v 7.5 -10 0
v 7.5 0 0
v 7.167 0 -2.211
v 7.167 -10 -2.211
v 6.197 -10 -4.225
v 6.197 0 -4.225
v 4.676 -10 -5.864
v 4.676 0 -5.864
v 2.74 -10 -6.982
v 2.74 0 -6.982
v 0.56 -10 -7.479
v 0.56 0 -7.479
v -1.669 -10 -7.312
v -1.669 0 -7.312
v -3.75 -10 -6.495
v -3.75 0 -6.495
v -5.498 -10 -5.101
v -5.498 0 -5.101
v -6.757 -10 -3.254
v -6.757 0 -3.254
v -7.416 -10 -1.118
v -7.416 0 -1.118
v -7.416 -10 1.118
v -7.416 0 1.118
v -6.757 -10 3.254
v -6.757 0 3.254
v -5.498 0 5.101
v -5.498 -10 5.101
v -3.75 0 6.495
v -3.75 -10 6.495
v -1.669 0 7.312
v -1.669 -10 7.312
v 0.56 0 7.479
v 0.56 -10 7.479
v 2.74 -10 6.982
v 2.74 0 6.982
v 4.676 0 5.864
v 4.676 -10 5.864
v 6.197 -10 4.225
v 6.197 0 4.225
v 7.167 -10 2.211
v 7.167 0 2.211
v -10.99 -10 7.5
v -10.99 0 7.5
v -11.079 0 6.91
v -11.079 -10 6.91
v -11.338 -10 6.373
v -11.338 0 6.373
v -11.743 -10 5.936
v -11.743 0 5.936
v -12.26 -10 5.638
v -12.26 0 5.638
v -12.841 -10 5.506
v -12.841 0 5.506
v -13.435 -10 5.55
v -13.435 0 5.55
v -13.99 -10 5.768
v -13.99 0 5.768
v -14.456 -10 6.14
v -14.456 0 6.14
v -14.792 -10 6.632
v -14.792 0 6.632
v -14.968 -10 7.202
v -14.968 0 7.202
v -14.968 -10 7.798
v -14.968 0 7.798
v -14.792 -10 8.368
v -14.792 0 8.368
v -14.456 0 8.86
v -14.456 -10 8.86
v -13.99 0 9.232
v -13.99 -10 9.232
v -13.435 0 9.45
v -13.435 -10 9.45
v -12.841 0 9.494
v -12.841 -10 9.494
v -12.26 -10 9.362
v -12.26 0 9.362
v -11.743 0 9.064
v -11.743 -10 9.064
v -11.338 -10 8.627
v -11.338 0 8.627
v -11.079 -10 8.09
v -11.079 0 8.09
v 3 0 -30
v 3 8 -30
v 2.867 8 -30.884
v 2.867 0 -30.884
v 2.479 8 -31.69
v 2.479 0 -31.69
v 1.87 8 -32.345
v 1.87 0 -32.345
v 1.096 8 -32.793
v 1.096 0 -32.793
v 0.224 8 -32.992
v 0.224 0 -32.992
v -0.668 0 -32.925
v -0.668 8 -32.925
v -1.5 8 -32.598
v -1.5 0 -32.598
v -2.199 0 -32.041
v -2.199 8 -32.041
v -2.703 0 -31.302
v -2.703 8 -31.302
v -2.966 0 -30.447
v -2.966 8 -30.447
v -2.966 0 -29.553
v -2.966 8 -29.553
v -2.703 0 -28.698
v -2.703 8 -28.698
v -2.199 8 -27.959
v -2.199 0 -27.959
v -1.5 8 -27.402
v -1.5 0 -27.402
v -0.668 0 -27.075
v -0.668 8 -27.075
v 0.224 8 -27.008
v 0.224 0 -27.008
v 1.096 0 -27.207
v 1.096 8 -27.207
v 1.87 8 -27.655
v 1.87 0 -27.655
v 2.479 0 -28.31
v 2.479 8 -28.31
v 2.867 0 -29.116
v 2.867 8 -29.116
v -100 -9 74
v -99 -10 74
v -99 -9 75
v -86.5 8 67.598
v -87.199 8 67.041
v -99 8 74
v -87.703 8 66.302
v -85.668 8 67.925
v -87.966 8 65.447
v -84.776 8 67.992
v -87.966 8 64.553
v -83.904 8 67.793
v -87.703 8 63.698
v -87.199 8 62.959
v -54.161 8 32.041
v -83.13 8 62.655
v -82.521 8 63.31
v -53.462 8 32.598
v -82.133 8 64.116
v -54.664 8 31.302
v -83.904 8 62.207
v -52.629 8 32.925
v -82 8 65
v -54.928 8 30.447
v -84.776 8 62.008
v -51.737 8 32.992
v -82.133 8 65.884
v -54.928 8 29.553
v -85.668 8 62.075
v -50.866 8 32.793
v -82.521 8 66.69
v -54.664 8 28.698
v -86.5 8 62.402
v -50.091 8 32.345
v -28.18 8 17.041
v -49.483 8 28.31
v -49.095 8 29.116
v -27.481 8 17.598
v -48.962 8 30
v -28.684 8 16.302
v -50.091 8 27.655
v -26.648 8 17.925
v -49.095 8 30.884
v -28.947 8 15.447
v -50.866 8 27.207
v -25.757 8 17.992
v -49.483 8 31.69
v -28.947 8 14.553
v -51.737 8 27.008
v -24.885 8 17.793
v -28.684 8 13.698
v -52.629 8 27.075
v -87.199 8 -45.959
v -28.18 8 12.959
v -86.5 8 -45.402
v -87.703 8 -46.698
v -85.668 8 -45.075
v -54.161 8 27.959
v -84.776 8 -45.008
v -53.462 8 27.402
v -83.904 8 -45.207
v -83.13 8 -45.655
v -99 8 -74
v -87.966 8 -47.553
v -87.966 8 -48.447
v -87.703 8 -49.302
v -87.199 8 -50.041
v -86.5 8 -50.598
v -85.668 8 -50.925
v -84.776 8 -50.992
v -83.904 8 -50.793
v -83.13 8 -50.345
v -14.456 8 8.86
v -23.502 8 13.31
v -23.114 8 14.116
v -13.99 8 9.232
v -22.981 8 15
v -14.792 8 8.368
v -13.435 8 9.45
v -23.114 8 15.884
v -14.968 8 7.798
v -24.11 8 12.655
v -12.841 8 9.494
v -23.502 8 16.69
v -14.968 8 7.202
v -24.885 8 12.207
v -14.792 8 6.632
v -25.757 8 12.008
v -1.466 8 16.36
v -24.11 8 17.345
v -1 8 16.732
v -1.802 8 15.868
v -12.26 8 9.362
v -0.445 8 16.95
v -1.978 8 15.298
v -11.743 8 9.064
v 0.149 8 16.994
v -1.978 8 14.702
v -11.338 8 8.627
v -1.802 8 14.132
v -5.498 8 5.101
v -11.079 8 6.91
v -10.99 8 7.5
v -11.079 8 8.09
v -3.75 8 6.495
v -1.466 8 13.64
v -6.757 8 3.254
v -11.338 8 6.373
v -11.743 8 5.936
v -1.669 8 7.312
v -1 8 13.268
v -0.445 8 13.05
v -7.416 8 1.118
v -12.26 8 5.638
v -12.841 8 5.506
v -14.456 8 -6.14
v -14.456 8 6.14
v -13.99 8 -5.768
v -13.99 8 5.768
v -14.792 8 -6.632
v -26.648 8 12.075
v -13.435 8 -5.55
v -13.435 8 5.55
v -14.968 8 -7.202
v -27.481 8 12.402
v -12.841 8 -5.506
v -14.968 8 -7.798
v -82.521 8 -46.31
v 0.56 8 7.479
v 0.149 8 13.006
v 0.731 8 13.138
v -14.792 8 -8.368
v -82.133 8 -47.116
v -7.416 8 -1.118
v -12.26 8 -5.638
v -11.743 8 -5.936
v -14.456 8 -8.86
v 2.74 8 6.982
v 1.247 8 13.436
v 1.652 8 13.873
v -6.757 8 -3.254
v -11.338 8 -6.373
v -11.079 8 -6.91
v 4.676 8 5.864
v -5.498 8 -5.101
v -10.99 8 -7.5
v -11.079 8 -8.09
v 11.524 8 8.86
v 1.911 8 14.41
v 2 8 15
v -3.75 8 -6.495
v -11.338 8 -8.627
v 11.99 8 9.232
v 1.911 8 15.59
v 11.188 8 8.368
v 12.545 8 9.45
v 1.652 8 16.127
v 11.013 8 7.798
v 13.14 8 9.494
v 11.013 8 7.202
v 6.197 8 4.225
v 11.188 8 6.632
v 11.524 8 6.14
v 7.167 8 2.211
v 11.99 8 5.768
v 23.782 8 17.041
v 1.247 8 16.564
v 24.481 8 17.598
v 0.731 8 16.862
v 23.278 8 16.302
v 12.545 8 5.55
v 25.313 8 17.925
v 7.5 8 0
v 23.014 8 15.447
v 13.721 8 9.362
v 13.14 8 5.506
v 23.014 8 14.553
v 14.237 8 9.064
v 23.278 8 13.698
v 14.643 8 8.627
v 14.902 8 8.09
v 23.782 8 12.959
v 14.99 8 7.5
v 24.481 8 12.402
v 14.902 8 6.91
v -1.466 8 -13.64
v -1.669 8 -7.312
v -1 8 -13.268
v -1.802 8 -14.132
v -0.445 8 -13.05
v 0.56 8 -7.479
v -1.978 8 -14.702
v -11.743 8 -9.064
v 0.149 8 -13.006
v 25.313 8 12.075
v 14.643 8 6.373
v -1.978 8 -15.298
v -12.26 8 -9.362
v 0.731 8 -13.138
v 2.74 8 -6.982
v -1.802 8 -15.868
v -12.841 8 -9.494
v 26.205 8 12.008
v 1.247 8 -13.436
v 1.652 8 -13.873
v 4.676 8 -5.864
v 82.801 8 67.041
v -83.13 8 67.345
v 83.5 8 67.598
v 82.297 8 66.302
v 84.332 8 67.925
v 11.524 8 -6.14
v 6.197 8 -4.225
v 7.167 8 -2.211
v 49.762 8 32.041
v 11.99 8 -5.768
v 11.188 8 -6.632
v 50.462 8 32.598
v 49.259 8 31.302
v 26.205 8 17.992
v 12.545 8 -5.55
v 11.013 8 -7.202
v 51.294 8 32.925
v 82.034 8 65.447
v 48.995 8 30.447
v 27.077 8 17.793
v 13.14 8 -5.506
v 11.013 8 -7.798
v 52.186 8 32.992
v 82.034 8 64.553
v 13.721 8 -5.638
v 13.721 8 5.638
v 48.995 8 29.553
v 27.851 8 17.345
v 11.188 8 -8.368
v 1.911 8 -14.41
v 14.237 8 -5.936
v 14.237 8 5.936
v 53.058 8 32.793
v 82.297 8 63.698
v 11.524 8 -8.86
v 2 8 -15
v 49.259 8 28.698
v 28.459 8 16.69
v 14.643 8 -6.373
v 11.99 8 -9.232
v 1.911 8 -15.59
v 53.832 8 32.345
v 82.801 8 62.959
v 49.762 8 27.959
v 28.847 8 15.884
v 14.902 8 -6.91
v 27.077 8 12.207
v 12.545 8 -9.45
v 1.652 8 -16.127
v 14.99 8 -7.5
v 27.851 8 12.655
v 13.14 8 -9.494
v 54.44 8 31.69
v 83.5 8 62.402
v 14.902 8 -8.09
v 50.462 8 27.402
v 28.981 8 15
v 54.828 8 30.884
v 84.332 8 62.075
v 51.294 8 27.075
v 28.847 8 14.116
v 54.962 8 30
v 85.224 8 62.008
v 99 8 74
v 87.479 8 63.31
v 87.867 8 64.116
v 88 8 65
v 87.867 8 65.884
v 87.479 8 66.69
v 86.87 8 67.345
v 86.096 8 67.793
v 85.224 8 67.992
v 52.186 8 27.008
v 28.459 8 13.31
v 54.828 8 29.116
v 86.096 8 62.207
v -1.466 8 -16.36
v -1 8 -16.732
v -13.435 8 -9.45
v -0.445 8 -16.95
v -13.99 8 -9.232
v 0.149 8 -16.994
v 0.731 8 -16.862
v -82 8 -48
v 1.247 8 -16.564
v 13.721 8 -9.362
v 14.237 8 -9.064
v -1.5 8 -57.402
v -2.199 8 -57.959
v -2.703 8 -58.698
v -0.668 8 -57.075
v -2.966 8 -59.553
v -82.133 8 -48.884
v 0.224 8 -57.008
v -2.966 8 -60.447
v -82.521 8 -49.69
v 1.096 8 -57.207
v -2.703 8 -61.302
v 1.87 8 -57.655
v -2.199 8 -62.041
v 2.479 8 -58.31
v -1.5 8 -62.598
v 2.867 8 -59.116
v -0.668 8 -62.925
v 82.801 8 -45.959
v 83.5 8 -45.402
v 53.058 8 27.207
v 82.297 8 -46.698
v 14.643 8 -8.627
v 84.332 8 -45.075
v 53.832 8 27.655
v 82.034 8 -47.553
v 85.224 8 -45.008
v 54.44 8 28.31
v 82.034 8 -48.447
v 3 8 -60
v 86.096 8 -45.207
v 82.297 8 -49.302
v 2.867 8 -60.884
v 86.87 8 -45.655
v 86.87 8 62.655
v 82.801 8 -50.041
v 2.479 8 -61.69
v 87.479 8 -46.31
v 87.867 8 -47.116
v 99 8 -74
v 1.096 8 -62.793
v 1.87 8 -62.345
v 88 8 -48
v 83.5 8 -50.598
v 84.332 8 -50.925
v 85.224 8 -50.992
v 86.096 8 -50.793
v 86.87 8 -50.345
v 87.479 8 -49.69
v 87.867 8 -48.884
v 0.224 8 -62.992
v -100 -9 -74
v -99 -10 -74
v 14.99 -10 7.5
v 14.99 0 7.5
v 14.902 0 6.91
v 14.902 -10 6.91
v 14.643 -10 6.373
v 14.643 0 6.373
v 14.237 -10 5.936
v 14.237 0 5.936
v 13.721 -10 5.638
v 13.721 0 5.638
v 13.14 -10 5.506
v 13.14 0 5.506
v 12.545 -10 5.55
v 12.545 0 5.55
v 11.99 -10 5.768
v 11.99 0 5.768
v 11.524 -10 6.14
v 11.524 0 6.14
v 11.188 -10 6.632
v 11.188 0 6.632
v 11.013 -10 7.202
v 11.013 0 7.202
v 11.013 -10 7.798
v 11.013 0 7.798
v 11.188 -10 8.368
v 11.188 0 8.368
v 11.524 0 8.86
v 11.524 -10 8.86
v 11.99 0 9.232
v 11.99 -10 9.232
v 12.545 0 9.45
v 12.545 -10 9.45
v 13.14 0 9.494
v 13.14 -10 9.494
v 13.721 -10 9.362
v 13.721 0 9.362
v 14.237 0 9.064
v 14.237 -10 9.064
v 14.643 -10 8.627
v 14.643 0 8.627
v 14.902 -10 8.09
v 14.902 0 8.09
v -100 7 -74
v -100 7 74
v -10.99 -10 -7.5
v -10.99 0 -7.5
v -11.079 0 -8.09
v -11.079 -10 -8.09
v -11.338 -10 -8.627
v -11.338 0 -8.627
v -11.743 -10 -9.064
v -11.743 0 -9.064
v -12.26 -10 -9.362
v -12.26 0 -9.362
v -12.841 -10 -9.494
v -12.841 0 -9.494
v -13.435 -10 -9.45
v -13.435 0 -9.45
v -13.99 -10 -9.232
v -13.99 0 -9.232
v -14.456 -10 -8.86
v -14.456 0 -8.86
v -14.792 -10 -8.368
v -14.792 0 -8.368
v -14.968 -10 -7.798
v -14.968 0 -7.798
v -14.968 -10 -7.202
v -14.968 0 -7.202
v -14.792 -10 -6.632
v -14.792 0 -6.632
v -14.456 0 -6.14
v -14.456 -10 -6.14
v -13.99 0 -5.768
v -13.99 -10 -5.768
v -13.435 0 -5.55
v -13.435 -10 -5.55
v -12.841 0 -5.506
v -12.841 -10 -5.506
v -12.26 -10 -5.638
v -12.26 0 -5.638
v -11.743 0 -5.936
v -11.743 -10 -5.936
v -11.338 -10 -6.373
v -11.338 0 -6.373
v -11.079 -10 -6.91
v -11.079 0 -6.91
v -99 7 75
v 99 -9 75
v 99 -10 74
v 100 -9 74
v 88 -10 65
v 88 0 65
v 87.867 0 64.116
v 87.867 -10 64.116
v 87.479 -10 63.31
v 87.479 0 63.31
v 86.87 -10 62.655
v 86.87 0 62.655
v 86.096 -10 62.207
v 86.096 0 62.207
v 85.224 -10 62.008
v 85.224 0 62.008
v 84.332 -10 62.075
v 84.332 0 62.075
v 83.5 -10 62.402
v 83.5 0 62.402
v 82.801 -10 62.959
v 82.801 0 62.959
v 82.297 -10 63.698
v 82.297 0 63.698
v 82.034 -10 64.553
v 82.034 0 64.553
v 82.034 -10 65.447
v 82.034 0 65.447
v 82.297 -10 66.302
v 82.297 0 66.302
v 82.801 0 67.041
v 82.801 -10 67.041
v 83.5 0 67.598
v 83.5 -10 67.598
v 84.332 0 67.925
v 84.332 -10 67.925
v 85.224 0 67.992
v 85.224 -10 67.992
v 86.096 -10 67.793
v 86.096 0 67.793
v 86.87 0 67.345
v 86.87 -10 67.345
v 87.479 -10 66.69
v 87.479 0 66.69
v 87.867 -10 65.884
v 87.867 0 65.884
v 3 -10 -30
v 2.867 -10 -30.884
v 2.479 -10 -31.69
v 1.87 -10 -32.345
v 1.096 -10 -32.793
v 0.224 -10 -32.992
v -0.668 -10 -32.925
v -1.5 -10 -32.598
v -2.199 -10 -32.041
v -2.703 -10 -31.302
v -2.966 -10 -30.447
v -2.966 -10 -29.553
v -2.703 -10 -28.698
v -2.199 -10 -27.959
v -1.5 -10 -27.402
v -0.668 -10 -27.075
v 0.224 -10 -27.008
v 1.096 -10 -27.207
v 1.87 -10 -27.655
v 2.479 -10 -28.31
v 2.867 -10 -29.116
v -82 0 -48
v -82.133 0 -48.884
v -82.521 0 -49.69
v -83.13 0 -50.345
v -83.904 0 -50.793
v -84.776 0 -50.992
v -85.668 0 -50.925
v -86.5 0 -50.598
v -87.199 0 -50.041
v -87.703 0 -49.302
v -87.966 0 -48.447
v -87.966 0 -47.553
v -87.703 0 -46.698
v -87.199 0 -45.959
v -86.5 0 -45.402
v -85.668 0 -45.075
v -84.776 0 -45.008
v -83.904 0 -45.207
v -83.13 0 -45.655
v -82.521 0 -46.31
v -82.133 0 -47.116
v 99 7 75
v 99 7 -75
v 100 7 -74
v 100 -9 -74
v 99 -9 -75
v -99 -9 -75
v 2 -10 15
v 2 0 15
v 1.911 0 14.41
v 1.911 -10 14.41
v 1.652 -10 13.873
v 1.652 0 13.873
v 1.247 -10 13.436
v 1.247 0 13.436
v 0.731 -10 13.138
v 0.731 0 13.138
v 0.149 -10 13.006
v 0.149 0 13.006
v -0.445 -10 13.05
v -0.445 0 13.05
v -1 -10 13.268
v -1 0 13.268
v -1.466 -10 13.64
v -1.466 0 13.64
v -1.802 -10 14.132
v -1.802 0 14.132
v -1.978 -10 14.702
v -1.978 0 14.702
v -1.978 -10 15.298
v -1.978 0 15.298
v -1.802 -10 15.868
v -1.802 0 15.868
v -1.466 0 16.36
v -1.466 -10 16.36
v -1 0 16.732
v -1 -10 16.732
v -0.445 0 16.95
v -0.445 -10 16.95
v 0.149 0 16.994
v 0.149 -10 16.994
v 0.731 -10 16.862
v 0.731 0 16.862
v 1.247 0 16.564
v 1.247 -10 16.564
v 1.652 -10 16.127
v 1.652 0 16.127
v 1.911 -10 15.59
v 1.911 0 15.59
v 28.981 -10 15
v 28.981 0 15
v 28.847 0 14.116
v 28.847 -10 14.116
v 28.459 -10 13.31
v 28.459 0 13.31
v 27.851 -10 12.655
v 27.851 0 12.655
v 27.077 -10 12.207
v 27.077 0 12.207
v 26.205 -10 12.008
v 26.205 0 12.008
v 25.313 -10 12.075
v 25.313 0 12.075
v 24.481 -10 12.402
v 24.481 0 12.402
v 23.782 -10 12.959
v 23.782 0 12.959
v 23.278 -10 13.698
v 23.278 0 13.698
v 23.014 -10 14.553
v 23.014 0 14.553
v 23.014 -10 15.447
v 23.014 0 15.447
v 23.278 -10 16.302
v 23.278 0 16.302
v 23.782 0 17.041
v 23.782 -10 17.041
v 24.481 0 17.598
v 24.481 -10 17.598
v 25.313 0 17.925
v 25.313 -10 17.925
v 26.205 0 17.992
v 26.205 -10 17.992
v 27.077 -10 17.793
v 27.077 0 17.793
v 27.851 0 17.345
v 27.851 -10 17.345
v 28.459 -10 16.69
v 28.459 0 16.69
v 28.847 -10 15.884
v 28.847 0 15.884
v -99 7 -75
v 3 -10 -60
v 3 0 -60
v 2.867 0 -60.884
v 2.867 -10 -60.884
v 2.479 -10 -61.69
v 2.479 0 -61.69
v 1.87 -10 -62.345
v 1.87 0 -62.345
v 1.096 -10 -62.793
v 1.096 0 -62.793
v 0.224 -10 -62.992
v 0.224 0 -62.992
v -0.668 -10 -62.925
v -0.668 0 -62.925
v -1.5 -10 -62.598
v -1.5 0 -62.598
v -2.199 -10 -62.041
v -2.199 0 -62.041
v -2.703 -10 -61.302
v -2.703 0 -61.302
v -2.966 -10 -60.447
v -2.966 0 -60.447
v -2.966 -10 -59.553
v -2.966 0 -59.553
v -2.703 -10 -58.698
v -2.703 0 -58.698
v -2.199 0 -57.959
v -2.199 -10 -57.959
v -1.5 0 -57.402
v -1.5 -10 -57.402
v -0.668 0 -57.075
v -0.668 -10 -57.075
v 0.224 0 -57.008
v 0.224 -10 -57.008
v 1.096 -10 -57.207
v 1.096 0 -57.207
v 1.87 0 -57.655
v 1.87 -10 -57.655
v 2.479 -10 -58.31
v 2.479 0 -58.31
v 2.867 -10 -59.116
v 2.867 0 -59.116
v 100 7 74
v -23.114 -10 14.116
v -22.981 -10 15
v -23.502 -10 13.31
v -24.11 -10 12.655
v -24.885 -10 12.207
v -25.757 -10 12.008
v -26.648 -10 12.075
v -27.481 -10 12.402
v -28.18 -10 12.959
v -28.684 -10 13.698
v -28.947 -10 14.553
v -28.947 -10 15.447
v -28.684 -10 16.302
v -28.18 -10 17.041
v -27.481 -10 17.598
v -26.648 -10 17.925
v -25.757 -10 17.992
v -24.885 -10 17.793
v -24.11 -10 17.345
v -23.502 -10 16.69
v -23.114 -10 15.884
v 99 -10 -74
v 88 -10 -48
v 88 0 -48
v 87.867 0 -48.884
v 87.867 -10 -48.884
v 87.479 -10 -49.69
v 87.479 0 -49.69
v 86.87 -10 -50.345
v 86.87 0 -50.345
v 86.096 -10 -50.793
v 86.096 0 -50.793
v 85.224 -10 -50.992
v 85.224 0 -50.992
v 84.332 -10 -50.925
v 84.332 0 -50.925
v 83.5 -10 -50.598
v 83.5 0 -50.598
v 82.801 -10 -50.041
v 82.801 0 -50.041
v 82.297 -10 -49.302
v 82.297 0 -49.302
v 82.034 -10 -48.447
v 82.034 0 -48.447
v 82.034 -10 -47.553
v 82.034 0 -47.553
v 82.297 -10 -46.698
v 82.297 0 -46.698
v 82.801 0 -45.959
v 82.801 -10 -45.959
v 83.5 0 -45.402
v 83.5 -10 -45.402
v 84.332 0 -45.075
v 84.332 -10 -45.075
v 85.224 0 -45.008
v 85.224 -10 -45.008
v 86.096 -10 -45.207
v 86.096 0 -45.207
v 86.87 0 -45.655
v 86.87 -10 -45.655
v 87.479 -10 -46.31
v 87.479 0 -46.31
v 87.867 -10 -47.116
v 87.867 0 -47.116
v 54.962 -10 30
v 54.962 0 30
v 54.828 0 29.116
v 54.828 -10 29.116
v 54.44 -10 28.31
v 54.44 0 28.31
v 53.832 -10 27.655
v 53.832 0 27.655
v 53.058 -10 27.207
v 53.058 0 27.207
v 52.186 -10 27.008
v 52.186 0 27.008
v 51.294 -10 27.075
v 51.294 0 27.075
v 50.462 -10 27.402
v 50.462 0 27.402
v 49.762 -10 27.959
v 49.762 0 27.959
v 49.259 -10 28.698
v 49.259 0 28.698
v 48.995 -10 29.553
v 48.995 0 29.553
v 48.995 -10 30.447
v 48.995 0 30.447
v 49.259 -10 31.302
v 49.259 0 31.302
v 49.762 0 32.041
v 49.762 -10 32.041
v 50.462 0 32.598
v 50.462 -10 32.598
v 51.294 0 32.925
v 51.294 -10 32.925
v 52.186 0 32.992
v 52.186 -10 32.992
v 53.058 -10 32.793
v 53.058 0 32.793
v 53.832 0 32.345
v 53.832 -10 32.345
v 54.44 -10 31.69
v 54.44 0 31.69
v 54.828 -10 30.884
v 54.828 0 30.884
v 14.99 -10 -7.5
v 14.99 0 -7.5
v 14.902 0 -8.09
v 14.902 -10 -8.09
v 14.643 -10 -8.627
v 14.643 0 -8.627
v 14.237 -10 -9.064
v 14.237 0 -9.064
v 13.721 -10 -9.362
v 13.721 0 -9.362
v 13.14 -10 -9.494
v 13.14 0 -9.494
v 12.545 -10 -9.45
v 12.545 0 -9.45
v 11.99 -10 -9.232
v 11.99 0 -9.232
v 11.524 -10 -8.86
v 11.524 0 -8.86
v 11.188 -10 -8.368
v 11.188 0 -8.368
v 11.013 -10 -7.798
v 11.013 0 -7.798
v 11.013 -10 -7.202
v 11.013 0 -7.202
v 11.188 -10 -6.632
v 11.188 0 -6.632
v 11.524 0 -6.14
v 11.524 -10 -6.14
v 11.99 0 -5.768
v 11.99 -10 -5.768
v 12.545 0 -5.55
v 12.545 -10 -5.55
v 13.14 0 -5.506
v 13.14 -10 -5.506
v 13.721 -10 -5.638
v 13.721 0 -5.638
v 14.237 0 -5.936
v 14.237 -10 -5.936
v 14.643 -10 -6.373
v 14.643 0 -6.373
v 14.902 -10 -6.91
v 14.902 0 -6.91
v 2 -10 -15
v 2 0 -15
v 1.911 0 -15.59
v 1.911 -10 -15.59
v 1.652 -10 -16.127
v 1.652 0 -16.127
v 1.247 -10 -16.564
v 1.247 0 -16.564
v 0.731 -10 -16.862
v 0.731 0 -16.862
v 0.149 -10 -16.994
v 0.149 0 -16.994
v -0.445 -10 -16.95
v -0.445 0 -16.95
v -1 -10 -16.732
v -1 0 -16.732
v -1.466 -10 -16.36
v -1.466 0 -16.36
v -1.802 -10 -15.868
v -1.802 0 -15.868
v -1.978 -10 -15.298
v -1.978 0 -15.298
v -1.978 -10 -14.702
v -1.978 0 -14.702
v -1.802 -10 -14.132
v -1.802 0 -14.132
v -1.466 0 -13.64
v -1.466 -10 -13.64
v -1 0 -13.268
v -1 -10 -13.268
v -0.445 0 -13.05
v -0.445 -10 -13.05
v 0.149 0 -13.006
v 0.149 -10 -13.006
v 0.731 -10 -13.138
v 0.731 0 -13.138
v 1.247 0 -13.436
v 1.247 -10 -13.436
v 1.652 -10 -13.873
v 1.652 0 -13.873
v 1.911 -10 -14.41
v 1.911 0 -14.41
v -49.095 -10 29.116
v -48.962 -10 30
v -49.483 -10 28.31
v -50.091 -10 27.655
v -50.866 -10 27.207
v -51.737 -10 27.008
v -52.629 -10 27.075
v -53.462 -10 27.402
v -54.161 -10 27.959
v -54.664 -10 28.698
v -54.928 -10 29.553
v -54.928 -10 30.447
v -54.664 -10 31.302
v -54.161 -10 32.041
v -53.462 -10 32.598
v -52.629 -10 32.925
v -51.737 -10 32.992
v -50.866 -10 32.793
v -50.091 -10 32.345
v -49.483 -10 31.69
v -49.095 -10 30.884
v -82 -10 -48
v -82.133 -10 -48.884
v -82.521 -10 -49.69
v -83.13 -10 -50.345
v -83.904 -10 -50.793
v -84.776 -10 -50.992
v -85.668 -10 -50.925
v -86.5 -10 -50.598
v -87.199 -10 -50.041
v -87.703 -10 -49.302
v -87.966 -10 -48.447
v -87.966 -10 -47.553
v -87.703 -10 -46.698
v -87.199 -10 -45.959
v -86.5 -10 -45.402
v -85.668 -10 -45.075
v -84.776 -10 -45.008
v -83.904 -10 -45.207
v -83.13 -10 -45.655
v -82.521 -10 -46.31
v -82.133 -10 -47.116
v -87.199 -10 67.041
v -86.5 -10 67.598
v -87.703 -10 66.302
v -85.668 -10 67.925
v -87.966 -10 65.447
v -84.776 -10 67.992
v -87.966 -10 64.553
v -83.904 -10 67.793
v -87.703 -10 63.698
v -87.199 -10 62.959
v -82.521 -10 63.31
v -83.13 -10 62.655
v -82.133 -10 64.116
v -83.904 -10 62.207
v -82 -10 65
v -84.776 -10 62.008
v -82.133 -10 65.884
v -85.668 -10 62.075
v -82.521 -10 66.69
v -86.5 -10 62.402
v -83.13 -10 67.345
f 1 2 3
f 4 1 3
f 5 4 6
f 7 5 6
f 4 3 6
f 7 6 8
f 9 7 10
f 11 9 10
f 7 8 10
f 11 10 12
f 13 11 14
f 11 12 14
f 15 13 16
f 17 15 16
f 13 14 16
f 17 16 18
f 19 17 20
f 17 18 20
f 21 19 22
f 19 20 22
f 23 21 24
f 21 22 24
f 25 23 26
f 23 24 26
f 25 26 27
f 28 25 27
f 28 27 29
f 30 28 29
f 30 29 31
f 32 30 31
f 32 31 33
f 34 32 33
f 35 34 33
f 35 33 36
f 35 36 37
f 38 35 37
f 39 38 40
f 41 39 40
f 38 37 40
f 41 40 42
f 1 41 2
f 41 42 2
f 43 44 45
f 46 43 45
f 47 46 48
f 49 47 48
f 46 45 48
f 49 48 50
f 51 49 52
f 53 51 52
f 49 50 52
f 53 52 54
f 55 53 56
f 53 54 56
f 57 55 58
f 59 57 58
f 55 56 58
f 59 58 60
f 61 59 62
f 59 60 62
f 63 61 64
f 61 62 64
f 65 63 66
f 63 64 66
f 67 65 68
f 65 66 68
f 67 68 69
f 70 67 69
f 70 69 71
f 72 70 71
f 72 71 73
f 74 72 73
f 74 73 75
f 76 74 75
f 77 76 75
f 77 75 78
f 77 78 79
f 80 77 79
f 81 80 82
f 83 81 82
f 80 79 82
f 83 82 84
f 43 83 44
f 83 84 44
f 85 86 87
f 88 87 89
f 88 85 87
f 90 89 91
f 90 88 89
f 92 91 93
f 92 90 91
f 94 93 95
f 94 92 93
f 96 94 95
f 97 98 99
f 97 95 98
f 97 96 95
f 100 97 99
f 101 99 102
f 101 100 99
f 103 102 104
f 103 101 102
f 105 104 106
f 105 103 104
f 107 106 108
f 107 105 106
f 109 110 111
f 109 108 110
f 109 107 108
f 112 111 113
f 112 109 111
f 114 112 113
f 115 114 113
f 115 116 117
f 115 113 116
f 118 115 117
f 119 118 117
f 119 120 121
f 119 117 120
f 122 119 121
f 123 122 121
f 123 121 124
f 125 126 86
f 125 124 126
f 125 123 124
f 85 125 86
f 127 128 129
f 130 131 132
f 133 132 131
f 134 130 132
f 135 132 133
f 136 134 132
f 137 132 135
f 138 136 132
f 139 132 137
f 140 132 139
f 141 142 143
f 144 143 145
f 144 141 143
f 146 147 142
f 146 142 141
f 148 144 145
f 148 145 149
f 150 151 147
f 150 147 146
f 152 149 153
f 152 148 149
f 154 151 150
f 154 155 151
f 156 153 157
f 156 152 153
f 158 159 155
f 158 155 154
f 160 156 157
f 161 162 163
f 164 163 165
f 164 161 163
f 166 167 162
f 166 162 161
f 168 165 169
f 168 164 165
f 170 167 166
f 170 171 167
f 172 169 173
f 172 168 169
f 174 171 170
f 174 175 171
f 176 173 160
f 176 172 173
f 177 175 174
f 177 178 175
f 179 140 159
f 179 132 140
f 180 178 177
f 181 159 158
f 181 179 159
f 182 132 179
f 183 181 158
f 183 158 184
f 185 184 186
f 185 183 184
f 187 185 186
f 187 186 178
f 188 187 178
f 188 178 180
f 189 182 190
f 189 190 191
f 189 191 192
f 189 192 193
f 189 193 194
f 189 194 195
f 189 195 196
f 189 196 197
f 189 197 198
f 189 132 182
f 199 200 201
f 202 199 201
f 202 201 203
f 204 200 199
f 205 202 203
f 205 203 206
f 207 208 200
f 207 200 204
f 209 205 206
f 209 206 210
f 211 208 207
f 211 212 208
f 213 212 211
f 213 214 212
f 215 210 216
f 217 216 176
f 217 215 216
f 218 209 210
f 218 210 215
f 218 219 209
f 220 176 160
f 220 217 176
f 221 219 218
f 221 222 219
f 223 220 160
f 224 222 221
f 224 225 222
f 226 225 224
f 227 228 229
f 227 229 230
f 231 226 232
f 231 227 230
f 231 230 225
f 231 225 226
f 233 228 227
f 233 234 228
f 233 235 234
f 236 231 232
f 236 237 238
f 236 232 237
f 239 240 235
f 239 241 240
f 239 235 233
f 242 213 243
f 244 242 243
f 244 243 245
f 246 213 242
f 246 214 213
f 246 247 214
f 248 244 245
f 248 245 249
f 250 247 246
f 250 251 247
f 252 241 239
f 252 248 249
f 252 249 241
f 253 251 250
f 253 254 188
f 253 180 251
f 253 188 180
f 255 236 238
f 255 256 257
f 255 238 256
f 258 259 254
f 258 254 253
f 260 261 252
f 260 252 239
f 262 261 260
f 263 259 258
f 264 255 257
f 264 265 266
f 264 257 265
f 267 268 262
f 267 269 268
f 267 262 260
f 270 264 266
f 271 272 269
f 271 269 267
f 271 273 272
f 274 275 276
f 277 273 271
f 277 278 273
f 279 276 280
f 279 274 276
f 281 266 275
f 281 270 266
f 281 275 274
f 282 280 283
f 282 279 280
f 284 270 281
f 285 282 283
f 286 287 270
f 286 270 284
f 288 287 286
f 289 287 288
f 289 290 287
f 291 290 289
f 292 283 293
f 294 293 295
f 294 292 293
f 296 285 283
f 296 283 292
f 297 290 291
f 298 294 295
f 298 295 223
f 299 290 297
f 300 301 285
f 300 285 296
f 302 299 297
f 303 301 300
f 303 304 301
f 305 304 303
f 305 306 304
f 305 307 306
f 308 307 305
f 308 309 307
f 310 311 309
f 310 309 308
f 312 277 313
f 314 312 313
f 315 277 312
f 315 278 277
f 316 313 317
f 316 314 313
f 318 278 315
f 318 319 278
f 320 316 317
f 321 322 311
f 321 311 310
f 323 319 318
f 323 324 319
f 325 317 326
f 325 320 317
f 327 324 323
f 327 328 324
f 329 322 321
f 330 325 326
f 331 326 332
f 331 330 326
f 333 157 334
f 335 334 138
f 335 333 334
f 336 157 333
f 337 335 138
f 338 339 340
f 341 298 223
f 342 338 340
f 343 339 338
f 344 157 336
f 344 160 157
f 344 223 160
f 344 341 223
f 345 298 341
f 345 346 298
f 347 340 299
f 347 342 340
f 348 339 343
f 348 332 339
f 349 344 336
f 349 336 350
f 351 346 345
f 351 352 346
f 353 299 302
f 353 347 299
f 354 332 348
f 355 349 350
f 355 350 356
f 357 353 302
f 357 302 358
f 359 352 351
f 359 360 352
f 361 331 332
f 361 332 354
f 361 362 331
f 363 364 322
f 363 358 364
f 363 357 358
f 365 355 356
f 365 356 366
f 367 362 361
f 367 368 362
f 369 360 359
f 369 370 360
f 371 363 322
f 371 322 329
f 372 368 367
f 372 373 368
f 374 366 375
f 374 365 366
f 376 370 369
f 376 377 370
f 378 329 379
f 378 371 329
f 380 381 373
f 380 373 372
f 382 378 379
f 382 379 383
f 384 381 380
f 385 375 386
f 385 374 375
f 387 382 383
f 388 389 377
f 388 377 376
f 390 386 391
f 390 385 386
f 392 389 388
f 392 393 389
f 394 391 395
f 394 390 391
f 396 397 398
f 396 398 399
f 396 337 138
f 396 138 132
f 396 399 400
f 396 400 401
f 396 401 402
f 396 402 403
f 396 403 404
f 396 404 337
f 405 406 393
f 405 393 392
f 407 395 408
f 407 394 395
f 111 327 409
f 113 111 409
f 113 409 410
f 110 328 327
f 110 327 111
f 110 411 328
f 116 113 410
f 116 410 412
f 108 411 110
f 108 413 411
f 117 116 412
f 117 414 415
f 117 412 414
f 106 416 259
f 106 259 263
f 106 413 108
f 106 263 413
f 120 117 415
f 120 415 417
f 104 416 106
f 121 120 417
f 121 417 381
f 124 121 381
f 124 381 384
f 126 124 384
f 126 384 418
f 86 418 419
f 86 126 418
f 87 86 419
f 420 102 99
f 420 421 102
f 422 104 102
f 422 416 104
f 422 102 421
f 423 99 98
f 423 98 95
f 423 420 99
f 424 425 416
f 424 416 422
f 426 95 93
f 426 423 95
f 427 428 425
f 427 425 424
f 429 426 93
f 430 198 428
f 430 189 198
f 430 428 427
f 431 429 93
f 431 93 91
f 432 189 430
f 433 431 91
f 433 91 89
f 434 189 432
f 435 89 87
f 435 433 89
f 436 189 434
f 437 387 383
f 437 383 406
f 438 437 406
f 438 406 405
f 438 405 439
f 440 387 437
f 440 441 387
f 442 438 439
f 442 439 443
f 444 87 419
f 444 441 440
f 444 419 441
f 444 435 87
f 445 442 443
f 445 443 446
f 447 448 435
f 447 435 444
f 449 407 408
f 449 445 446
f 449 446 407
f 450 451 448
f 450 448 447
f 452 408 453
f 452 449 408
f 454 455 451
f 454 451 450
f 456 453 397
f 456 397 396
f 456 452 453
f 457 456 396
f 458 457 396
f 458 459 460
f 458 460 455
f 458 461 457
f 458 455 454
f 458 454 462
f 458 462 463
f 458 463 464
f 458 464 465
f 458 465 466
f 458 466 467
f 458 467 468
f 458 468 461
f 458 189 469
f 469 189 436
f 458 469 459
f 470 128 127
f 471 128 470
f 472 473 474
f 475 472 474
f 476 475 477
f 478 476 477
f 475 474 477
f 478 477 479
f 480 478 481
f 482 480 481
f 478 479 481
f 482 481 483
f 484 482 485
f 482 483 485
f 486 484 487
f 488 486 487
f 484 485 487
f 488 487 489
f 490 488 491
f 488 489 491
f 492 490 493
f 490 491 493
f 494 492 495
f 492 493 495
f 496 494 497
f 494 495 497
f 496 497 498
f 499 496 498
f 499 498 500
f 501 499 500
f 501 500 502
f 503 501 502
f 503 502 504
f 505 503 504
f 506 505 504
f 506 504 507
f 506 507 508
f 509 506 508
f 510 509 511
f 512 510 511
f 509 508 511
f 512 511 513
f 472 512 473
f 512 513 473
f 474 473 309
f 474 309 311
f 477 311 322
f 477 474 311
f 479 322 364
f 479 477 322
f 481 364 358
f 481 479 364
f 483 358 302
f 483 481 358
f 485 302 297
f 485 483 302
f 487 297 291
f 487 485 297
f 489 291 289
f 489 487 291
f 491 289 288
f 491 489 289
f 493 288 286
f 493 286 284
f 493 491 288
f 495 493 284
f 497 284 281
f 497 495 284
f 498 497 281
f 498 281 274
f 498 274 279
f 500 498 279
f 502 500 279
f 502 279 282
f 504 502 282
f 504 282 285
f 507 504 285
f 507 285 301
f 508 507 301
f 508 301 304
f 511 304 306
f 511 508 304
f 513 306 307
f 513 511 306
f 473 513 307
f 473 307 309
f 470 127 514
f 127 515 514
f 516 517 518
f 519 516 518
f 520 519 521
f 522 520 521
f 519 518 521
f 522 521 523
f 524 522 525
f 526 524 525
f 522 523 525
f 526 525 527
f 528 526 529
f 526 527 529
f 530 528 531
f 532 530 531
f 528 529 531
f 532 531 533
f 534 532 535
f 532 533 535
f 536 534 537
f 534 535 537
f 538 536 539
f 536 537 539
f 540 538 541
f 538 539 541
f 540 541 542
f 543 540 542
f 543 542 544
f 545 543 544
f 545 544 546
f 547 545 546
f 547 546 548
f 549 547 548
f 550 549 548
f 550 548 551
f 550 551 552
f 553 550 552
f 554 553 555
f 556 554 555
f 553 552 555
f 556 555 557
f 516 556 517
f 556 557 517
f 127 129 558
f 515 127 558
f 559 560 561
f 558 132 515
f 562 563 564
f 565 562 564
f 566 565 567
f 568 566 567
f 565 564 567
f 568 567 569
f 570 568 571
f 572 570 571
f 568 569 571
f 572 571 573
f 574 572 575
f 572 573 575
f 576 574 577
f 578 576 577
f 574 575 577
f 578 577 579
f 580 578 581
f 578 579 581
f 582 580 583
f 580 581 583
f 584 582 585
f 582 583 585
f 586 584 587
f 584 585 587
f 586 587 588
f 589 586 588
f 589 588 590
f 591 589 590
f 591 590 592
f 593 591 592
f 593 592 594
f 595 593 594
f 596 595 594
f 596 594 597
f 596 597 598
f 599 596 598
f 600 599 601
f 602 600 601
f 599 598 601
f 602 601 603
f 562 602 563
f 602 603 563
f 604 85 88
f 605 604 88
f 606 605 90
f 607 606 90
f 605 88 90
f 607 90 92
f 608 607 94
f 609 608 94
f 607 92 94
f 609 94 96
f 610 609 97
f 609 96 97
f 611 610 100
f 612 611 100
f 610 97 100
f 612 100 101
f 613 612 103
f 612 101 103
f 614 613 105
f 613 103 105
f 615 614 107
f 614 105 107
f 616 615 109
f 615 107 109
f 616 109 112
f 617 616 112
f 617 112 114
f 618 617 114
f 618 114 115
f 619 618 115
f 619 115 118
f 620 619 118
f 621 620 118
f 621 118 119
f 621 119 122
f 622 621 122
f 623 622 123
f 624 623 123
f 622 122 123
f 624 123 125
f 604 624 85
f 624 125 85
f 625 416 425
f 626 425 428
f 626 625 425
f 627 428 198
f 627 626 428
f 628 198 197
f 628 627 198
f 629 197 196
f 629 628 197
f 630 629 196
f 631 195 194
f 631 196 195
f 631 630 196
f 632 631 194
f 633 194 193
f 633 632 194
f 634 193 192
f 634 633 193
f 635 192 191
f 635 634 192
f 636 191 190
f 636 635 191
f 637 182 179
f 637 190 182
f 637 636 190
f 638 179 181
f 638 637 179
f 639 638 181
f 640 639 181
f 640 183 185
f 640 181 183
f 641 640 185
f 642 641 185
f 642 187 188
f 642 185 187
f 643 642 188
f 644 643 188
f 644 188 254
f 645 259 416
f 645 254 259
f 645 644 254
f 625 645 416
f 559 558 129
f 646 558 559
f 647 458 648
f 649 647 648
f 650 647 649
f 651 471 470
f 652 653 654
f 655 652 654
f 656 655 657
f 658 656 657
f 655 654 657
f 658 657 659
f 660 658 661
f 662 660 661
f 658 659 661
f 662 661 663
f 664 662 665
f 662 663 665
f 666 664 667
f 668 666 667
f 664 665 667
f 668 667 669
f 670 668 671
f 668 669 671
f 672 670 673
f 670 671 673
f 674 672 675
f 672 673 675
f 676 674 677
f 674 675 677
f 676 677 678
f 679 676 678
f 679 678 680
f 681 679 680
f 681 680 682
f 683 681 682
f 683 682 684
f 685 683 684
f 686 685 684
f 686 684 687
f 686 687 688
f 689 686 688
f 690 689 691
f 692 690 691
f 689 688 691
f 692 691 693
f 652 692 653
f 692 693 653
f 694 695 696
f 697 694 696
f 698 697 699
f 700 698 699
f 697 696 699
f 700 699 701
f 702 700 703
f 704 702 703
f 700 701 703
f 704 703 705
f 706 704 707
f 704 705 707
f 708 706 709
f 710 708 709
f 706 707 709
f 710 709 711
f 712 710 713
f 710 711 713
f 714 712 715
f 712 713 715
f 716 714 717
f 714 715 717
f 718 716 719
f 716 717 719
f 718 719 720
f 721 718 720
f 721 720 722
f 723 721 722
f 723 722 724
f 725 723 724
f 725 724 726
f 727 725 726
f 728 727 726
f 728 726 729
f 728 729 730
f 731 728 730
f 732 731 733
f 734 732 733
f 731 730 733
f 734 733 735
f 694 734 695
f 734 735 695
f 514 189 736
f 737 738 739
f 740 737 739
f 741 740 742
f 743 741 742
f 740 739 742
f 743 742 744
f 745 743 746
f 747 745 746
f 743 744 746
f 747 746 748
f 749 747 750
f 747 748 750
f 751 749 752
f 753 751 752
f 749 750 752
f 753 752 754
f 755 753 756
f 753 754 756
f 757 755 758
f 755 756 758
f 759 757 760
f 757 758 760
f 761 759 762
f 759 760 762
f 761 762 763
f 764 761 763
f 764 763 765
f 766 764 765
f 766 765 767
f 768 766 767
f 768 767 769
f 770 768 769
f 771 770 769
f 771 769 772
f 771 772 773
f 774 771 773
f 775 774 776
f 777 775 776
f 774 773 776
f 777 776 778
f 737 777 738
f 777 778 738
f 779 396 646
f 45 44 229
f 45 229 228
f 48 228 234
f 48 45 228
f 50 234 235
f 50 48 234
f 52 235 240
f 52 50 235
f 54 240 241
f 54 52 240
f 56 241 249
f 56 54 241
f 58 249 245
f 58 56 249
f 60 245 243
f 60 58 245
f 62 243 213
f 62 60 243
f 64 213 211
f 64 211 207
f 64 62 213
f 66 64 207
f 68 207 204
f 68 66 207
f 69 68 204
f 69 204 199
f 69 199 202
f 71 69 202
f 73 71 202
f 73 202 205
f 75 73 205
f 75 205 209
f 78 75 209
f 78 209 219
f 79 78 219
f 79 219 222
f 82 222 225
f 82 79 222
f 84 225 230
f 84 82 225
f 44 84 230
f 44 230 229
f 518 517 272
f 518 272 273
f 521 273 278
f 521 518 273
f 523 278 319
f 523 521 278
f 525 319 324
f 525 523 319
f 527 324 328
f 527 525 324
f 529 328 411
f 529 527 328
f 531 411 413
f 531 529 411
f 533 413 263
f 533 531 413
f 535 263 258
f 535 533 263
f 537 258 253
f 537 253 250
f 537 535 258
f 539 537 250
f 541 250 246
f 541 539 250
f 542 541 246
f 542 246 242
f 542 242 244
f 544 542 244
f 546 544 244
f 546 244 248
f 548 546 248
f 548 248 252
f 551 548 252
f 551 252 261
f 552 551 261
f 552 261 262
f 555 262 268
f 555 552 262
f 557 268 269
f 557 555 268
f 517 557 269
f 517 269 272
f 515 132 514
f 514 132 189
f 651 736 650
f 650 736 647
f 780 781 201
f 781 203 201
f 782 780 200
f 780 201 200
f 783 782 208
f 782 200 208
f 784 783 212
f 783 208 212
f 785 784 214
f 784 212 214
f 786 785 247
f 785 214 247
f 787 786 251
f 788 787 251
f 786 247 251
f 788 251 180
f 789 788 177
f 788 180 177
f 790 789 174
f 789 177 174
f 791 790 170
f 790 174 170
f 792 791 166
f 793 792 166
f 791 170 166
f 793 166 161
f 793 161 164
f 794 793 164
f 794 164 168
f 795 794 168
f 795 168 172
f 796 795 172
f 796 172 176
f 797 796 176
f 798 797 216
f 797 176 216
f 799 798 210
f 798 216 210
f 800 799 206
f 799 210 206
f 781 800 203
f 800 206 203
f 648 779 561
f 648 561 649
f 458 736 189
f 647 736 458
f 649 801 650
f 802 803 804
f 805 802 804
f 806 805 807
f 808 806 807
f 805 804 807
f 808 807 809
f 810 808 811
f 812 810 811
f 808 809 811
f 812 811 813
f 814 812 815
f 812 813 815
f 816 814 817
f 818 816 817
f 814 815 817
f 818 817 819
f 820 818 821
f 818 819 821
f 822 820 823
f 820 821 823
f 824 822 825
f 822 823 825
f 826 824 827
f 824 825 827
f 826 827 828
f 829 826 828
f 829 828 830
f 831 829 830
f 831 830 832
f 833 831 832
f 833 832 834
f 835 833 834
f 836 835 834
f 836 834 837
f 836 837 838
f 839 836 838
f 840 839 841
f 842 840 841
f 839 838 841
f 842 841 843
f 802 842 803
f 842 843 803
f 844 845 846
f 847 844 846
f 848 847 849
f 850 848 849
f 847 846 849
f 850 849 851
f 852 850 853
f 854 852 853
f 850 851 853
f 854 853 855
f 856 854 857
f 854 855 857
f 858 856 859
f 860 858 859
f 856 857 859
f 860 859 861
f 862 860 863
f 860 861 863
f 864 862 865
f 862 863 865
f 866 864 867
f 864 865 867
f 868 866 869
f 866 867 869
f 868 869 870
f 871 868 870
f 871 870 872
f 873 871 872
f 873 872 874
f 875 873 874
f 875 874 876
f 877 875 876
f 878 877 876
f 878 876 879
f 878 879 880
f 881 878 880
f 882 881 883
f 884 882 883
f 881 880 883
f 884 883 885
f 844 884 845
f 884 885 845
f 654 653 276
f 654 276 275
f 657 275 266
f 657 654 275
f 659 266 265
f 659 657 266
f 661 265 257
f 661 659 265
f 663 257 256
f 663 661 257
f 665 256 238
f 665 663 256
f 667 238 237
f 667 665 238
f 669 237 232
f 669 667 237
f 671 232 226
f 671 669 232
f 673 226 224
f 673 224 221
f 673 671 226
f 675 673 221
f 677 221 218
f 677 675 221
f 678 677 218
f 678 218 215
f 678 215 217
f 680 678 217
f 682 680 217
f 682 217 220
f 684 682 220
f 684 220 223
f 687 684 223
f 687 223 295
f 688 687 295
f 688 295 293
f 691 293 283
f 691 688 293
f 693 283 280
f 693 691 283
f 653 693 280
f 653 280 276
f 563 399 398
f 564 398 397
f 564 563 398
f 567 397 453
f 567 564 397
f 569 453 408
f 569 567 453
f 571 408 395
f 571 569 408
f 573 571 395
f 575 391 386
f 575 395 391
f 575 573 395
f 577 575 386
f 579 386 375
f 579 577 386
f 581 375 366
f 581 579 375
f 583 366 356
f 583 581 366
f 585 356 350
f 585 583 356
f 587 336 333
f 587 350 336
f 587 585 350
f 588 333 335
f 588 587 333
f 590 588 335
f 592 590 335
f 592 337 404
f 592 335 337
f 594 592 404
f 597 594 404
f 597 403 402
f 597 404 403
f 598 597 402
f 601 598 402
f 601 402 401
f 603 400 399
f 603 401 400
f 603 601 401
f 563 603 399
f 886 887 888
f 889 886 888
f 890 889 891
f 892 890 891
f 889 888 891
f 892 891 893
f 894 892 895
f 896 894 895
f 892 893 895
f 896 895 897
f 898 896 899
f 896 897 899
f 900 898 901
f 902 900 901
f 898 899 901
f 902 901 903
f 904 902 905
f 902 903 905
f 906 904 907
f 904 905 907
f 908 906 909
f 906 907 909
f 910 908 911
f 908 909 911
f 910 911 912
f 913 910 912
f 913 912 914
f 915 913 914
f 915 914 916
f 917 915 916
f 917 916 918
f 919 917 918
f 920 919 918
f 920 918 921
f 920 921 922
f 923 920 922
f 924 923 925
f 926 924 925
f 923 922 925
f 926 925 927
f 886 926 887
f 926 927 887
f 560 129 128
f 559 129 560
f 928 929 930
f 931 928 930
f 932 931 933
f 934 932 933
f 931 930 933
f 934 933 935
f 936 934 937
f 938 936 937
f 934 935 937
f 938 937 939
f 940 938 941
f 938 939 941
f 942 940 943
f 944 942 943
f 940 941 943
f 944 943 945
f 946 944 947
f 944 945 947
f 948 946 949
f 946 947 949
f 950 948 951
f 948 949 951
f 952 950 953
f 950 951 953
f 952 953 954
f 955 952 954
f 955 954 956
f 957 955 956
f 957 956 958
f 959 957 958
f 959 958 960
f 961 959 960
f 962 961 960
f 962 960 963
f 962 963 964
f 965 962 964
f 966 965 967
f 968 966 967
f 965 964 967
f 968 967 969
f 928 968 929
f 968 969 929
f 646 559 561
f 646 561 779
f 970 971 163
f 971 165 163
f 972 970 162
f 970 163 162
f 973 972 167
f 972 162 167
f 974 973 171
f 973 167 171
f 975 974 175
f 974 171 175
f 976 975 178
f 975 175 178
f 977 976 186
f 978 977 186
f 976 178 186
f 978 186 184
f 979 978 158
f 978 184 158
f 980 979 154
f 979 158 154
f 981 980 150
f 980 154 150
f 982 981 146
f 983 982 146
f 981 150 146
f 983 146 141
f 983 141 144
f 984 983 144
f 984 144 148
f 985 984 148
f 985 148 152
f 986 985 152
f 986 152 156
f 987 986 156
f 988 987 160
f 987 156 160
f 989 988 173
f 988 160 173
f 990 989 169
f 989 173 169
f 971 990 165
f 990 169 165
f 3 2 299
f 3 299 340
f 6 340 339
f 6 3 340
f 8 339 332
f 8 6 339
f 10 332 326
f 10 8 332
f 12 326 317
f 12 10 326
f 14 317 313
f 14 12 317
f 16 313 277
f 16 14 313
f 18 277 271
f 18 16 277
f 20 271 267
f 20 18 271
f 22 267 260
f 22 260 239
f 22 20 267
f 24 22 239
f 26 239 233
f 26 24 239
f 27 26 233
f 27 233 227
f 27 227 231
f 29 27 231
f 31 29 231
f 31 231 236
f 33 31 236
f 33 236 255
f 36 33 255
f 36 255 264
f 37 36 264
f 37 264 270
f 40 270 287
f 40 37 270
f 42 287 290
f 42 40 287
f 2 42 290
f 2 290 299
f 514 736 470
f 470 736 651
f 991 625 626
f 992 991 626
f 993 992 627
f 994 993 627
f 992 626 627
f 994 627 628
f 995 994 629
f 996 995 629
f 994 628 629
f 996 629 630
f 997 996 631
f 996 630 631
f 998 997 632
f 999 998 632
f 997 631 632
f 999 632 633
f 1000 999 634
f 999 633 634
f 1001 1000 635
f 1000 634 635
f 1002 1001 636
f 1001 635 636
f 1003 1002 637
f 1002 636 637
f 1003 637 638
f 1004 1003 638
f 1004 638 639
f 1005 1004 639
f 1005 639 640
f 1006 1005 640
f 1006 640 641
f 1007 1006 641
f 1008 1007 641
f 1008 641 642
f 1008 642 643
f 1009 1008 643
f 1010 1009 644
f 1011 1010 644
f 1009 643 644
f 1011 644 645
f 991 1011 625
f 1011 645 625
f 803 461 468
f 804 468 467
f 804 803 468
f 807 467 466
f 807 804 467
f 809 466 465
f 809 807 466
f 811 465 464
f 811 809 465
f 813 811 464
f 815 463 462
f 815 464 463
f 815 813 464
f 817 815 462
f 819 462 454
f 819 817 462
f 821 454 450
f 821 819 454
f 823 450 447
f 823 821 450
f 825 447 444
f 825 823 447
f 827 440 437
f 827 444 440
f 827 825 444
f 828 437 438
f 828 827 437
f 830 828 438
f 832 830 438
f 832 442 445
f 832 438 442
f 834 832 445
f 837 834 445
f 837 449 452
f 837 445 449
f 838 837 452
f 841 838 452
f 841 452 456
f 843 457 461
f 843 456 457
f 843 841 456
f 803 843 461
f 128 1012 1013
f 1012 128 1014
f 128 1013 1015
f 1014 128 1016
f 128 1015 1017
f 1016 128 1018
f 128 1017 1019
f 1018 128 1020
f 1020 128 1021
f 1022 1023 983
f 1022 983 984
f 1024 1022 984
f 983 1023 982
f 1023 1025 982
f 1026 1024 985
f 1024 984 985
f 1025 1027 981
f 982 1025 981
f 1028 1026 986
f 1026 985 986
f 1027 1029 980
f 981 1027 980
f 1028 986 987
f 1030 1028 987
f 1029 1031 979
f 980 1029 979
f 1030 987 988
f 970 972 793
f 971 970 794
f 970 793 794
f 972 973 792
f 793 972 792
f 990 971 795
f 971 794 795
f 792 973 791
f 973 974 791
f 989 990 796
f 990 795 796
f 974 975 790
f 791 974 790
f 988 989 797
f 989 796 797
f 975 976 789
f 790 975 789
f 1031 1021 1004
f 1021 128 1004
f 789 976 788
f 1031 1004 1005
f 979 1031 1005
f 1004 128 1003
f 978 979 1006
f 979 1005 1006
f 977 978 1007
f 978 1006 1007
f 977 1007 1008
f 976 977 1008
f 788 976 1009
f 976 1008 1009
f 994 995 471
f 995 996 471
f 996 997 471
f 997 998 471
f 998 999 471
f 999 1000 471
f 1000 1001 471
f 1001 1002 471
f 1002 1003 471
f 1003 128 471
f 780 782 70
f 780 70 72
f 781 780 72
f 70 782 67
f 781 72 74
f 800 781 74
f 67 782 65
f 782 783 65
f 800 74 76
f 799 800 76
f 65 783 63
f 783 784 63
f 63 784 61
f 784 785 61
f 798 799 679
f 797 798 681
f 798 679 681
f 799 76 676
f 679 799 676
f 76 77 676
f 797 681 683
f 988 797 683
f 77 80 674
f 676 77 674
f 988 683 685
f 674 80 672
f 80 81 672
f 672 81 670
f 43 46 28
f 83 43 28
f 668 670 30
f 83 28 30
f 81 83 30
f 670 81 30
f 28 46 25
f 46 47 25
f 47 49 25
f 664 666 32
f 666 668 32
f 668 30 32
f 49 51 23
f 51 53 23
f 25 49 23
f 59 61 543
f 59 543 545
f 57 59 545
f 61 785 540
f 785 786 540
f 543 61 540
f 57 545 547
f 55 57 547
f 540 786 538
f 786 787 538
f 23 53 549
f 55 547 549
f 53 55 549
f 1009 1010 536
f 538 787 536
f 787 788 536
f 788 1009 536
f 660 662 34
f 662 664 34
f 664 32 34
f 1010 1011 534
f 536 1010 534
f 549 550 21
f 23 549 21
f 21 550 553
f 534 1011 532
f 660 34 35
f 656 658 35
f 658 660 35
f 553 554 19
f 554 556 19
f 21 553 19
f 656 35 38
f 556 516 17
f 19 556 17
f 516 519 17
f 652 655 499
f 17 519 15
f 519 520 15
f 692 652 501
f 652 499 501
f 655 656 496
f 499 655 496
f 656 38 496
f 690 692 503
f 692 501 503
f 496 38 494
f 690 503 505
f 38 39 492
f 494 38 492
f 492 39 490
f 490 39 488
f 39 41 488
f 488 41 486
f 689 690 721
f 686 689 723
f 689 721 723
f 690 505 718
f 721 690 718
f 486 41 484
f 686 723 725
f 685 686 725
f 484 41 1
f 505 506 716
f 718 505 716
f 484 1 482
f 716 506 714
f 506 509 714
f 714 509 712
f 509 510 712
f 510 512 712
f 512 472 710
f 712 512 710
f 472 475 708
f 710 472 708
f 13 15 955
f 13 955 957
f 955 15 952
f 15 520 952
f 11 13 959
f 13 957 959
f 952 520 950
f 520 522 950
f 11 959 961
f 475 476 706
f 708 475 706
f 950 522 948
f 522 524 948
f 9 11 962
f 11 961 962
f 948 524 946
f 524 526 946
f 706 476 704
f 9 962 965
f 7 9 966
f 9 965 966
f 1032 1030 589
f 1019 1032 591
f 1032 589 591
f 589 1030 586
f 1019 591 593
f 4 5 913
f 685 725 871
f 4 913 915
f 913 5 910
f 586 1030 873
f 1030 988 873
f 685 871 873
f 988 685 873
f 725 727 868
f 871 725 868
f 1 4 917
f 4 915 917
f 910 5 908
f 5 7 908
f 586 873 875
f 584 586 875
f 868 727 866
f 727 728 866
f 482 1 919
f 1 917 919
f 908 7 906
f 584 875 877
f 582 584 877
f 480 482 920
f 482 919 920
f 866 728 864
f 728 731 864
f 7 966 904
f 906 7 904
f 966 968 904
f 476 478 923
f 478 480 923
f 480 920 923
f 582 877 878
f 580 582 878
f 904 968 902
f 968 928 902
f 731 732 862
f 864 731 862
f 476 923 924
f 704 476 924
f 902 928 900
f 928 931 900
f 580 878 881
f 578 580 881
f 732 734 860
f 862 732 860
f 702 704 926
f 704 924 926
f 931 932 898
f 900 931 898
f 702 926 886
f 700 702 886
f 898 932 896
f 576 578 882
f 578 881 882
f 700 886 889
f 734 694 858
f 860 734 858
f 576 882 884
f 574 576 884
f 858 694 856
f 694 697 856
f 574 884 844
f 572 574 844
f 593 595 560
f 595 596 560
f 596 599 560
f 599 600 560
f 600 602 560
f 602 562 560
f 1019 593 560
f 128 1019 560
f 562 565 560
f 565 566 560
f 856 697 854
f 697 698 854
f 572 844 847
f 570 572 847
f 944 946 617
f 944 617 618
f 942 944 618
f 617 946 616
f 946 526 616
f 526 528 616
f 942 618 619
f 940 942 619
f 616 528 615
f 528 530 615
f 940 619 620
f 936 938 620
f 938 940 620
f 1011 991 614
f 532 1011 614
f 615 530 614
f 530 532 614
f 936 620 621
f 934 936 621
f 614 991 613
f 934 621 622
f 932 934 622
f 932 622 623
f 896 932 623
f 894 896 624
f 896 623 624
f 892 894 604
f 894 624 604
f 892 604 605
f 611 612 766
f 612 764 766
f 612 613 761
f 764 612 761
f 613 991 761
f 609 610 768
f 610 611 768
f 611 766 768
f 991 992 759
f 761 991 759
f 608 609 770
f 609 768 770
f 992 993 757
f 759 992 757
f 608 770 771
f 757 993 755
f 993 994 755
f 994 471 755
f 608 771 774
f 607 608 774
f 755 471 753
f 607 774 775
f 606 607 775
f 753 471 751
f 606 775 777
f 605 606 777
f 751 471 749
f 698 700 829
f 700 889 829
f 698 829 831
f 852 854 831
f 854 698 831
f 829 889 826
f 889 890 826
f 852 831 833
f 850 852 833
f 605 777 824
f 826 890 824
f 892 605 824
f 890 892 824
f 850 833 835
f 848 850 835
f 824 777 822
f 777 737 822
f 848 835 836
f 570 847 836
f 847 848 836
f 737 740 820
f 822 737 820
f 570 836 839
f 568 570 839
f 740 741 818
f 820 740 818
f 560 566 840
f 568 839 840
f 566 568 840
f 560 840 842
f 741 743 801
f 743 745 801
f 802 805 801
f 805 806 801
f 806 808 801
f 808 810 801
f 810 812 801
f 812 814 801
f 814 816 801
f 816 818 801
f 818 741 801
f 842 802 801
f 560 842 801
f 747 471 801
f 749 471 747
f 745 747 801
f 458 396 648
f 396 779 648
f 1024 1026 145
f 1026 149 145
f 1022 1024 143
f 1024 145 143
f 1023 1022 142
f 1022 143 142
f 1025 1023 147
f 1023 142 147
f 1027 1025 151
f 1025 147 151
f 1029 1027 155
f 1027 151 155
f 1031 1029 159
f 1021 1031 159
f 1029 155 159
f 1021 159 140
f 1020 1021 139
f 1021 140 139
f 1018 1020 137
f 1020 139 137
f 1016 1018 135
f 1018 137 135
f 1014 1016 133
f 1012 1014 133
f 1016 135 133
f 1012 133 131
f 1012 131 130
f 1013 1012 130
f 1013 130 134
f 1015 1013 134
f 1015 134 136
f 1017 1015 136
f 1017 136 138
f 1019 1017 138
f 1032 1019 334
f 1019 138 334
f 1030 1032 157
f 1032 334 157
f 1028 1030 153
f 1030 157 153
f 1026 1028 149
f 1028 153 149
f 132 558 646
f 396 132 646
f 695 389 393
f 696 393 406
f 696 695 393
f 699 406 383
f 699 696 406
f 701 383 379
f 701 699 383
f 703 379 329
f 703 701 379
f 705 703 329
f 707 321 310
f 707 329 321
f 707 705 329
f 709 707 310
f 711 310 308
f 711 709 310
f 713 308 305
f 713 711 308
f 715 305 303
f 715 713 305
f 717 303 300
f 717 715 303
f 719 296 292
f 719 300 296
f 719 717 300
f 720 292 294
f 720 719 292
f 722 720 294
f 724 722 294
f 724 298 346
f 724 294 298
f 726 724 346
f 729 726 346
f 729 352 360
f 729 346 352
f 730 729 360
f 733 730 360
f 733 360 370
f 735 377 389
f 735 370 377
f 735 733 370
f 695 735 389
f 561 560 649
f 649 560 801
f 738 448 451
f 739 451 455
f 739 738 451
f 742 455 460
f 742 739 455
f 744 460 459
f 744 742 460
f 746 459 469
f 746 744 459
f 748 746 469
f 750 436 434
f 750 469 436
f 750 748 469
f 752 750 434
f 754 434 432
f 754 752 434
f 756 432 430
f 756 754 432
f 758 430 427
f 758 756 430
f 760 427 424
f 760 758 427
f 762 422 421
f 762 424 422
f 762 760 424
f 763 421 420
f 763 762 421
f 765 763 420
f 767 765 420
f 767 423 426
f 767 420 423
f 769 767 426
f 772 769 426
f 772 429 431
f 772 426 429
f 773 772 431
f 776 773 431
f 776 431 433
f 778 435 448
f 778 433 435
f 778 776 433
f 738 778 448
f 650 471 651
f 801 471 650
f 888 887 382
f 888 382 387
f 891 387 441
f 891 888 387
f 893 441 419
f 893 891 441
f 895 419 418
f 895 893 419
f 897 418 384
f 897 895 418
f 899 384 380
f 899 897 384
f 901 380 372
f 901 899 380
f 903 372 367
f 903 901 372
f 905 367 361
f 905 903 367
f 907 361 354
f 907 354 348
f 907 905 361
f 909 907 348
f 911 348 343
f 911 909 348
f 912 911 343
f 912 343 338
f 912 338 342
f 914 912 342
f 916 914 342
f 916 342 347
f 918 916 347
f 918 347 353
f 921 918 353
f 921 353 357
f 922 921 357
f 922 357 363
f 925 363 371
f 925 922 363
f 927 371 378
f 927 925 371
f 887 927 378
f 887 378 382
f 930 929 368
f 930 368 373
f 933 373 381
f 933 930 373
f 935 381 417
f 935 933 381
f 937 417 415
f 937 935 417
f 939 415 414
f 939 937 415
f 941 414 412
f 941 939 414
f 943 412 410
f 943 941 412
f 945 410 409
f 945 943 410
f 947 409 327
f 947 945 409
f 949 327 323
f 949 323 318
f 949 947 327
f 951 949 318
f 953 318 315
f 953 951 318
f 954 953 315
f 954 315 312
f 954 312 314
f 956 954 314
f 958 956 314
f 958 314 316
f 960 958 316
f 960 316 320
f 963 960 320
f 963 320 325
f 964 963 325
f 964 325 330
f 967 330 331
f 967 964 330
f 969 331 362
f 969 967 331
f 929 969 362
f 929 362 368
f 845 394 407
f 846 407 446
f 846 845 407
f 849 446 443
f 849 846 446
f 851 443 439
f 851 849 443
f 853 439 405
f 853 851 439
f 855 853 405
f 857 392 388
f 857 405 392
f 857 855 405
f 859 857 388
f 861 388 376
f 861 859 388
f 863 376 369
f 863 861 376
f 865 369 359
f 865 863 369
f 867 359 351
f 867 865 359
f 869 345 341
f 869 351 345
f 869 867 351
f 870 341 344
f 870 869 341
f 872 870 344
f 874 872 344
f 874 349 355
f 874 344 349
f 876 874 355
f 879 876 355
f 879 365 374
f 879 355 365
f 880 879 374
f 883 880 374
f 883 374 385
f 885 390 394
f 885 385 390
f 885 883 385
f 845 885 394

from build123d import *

# Parameters (mm, degrees)
SKETCH1_W                = 200
SKETCH1_H                = 150
SKETCH1_R                = 7.5
SKETCH1_R_2              = 2
BOSS_EXTRUDE1_DEPTH      = 8
BOSS_EXTRUDE1_DEPTH_BACK = 10
SKETCH2_R                = 3
CUT_EXTRUDE2_DEPTH       = 10
CUT_EXTRUDE2_DEPTH_BACK  = 10
CHAMFER2_SIZE            = 1


with BuildPart() as part:
    # Sketch1 → Boss-Extrude1 (new body, two sides)
    with BuildSketch(Plane(origin=(0, 0, 0), x_dir=(1, 0, 0), z_dir=(0, 1, 0))) as boss_extrude1_sk:
        Rectangle(SKETCH1_W, SKETCH1_H)
        Circle(SKETCH1_R, mode=Mode.SUBTRACT)
        with Locations((0, 15)):
            Circle(SKETCH1_R_2, mode=Mode.SUBTRACT)
        with Locations((12.990381057, 7.5)):
            Circle(SKETCH1_R_2, mode=Mode.SUBTRACT)
        with Locations((12.990381057, -7.5)):
            Circle(SKETCH1_R_2, mode=Mode.SUBTRACT)
        with Locations((0, -15)):
            Circle(SKETCH1_R_2, mode=Mode.SUBTRACT)
        with Locations((-12.990381057, -7.5)):
            Circle(SKETCH1_R_2, mode=Mode.SUBTRACT)
        with Locations((-12.990381057, 7.5)):
            Circle(SKETCH1_R_2, mode=Mode.SUBTRACT)
    extrude(amount=BOSS_EXTRUDE1_DEPTH)
    extrude(boss_extrude1_sk.sketch, amount=-BOSS_EXTRUDE1_DEPTH_BACK)

    # Sketch2 → Cut-Extrude2 (cut, two sides)
    with BuildSketch(Plane(origin=(0, 0, 0), x_dir=(1, 0, 0), z_dir=(0, 1, 0))) as cut_extrude2_sk:
        with Locations((-25.980762114, -15)):
            Circle(SKETCH2_R)
        with Locations((0, 30)):
            Circle(SKETCH2_R)
        with Locations((25.980762114, -15)):
            Circle(SKETCH2_R)
        with Locations((85, 48)):
            Circle(SKETCH2_R)
        with Locations((85, -65)):
            Circle(SKETCH2_R)
        with Locations((-51.961524227, -30)):
            Circle(SKETCH2_R)
        with Locations((-85, -65)):
            Circle(SKETCH2_R)
        with Locations((-85, 48)):
            Circle(SKETCH2_R)
        with Locations((0, 60)):
            Circle(SKETCH2_R)
        with Locations((51.961524227, -30)):
            Circle(SKETCH2_R)
    extrude(amount=CUT_EXTRUDE2_DEPTH, mode=Mode.SUBTRACT)
    extrude(cut_extrude2_sk.sketch, amount=-CUT_EXTRUDE2_DEPTH_BACK, mode=Mode.SUBTRACT)

    # Chamfer2
    chamfer2_edges = [part.edges().sort_by_distance(p)[0] for p in [
        (-100, -10, 0),
        (0, -10, 75),
        (100, 8, 0),
        (0, 8, -75),
        (-100, 8, 0),
        (0, 8, 75),
        (100, -10, 0),
        (0, -10, -75),
        (100, -1, 75),
        (-100, -1, 75),
        (-100, -1, -75),
        (100, -1, -75),
    ]]
    chamfer(chamfer2_edges, length=CHAMFER2_SIZE)


solid = part.part
